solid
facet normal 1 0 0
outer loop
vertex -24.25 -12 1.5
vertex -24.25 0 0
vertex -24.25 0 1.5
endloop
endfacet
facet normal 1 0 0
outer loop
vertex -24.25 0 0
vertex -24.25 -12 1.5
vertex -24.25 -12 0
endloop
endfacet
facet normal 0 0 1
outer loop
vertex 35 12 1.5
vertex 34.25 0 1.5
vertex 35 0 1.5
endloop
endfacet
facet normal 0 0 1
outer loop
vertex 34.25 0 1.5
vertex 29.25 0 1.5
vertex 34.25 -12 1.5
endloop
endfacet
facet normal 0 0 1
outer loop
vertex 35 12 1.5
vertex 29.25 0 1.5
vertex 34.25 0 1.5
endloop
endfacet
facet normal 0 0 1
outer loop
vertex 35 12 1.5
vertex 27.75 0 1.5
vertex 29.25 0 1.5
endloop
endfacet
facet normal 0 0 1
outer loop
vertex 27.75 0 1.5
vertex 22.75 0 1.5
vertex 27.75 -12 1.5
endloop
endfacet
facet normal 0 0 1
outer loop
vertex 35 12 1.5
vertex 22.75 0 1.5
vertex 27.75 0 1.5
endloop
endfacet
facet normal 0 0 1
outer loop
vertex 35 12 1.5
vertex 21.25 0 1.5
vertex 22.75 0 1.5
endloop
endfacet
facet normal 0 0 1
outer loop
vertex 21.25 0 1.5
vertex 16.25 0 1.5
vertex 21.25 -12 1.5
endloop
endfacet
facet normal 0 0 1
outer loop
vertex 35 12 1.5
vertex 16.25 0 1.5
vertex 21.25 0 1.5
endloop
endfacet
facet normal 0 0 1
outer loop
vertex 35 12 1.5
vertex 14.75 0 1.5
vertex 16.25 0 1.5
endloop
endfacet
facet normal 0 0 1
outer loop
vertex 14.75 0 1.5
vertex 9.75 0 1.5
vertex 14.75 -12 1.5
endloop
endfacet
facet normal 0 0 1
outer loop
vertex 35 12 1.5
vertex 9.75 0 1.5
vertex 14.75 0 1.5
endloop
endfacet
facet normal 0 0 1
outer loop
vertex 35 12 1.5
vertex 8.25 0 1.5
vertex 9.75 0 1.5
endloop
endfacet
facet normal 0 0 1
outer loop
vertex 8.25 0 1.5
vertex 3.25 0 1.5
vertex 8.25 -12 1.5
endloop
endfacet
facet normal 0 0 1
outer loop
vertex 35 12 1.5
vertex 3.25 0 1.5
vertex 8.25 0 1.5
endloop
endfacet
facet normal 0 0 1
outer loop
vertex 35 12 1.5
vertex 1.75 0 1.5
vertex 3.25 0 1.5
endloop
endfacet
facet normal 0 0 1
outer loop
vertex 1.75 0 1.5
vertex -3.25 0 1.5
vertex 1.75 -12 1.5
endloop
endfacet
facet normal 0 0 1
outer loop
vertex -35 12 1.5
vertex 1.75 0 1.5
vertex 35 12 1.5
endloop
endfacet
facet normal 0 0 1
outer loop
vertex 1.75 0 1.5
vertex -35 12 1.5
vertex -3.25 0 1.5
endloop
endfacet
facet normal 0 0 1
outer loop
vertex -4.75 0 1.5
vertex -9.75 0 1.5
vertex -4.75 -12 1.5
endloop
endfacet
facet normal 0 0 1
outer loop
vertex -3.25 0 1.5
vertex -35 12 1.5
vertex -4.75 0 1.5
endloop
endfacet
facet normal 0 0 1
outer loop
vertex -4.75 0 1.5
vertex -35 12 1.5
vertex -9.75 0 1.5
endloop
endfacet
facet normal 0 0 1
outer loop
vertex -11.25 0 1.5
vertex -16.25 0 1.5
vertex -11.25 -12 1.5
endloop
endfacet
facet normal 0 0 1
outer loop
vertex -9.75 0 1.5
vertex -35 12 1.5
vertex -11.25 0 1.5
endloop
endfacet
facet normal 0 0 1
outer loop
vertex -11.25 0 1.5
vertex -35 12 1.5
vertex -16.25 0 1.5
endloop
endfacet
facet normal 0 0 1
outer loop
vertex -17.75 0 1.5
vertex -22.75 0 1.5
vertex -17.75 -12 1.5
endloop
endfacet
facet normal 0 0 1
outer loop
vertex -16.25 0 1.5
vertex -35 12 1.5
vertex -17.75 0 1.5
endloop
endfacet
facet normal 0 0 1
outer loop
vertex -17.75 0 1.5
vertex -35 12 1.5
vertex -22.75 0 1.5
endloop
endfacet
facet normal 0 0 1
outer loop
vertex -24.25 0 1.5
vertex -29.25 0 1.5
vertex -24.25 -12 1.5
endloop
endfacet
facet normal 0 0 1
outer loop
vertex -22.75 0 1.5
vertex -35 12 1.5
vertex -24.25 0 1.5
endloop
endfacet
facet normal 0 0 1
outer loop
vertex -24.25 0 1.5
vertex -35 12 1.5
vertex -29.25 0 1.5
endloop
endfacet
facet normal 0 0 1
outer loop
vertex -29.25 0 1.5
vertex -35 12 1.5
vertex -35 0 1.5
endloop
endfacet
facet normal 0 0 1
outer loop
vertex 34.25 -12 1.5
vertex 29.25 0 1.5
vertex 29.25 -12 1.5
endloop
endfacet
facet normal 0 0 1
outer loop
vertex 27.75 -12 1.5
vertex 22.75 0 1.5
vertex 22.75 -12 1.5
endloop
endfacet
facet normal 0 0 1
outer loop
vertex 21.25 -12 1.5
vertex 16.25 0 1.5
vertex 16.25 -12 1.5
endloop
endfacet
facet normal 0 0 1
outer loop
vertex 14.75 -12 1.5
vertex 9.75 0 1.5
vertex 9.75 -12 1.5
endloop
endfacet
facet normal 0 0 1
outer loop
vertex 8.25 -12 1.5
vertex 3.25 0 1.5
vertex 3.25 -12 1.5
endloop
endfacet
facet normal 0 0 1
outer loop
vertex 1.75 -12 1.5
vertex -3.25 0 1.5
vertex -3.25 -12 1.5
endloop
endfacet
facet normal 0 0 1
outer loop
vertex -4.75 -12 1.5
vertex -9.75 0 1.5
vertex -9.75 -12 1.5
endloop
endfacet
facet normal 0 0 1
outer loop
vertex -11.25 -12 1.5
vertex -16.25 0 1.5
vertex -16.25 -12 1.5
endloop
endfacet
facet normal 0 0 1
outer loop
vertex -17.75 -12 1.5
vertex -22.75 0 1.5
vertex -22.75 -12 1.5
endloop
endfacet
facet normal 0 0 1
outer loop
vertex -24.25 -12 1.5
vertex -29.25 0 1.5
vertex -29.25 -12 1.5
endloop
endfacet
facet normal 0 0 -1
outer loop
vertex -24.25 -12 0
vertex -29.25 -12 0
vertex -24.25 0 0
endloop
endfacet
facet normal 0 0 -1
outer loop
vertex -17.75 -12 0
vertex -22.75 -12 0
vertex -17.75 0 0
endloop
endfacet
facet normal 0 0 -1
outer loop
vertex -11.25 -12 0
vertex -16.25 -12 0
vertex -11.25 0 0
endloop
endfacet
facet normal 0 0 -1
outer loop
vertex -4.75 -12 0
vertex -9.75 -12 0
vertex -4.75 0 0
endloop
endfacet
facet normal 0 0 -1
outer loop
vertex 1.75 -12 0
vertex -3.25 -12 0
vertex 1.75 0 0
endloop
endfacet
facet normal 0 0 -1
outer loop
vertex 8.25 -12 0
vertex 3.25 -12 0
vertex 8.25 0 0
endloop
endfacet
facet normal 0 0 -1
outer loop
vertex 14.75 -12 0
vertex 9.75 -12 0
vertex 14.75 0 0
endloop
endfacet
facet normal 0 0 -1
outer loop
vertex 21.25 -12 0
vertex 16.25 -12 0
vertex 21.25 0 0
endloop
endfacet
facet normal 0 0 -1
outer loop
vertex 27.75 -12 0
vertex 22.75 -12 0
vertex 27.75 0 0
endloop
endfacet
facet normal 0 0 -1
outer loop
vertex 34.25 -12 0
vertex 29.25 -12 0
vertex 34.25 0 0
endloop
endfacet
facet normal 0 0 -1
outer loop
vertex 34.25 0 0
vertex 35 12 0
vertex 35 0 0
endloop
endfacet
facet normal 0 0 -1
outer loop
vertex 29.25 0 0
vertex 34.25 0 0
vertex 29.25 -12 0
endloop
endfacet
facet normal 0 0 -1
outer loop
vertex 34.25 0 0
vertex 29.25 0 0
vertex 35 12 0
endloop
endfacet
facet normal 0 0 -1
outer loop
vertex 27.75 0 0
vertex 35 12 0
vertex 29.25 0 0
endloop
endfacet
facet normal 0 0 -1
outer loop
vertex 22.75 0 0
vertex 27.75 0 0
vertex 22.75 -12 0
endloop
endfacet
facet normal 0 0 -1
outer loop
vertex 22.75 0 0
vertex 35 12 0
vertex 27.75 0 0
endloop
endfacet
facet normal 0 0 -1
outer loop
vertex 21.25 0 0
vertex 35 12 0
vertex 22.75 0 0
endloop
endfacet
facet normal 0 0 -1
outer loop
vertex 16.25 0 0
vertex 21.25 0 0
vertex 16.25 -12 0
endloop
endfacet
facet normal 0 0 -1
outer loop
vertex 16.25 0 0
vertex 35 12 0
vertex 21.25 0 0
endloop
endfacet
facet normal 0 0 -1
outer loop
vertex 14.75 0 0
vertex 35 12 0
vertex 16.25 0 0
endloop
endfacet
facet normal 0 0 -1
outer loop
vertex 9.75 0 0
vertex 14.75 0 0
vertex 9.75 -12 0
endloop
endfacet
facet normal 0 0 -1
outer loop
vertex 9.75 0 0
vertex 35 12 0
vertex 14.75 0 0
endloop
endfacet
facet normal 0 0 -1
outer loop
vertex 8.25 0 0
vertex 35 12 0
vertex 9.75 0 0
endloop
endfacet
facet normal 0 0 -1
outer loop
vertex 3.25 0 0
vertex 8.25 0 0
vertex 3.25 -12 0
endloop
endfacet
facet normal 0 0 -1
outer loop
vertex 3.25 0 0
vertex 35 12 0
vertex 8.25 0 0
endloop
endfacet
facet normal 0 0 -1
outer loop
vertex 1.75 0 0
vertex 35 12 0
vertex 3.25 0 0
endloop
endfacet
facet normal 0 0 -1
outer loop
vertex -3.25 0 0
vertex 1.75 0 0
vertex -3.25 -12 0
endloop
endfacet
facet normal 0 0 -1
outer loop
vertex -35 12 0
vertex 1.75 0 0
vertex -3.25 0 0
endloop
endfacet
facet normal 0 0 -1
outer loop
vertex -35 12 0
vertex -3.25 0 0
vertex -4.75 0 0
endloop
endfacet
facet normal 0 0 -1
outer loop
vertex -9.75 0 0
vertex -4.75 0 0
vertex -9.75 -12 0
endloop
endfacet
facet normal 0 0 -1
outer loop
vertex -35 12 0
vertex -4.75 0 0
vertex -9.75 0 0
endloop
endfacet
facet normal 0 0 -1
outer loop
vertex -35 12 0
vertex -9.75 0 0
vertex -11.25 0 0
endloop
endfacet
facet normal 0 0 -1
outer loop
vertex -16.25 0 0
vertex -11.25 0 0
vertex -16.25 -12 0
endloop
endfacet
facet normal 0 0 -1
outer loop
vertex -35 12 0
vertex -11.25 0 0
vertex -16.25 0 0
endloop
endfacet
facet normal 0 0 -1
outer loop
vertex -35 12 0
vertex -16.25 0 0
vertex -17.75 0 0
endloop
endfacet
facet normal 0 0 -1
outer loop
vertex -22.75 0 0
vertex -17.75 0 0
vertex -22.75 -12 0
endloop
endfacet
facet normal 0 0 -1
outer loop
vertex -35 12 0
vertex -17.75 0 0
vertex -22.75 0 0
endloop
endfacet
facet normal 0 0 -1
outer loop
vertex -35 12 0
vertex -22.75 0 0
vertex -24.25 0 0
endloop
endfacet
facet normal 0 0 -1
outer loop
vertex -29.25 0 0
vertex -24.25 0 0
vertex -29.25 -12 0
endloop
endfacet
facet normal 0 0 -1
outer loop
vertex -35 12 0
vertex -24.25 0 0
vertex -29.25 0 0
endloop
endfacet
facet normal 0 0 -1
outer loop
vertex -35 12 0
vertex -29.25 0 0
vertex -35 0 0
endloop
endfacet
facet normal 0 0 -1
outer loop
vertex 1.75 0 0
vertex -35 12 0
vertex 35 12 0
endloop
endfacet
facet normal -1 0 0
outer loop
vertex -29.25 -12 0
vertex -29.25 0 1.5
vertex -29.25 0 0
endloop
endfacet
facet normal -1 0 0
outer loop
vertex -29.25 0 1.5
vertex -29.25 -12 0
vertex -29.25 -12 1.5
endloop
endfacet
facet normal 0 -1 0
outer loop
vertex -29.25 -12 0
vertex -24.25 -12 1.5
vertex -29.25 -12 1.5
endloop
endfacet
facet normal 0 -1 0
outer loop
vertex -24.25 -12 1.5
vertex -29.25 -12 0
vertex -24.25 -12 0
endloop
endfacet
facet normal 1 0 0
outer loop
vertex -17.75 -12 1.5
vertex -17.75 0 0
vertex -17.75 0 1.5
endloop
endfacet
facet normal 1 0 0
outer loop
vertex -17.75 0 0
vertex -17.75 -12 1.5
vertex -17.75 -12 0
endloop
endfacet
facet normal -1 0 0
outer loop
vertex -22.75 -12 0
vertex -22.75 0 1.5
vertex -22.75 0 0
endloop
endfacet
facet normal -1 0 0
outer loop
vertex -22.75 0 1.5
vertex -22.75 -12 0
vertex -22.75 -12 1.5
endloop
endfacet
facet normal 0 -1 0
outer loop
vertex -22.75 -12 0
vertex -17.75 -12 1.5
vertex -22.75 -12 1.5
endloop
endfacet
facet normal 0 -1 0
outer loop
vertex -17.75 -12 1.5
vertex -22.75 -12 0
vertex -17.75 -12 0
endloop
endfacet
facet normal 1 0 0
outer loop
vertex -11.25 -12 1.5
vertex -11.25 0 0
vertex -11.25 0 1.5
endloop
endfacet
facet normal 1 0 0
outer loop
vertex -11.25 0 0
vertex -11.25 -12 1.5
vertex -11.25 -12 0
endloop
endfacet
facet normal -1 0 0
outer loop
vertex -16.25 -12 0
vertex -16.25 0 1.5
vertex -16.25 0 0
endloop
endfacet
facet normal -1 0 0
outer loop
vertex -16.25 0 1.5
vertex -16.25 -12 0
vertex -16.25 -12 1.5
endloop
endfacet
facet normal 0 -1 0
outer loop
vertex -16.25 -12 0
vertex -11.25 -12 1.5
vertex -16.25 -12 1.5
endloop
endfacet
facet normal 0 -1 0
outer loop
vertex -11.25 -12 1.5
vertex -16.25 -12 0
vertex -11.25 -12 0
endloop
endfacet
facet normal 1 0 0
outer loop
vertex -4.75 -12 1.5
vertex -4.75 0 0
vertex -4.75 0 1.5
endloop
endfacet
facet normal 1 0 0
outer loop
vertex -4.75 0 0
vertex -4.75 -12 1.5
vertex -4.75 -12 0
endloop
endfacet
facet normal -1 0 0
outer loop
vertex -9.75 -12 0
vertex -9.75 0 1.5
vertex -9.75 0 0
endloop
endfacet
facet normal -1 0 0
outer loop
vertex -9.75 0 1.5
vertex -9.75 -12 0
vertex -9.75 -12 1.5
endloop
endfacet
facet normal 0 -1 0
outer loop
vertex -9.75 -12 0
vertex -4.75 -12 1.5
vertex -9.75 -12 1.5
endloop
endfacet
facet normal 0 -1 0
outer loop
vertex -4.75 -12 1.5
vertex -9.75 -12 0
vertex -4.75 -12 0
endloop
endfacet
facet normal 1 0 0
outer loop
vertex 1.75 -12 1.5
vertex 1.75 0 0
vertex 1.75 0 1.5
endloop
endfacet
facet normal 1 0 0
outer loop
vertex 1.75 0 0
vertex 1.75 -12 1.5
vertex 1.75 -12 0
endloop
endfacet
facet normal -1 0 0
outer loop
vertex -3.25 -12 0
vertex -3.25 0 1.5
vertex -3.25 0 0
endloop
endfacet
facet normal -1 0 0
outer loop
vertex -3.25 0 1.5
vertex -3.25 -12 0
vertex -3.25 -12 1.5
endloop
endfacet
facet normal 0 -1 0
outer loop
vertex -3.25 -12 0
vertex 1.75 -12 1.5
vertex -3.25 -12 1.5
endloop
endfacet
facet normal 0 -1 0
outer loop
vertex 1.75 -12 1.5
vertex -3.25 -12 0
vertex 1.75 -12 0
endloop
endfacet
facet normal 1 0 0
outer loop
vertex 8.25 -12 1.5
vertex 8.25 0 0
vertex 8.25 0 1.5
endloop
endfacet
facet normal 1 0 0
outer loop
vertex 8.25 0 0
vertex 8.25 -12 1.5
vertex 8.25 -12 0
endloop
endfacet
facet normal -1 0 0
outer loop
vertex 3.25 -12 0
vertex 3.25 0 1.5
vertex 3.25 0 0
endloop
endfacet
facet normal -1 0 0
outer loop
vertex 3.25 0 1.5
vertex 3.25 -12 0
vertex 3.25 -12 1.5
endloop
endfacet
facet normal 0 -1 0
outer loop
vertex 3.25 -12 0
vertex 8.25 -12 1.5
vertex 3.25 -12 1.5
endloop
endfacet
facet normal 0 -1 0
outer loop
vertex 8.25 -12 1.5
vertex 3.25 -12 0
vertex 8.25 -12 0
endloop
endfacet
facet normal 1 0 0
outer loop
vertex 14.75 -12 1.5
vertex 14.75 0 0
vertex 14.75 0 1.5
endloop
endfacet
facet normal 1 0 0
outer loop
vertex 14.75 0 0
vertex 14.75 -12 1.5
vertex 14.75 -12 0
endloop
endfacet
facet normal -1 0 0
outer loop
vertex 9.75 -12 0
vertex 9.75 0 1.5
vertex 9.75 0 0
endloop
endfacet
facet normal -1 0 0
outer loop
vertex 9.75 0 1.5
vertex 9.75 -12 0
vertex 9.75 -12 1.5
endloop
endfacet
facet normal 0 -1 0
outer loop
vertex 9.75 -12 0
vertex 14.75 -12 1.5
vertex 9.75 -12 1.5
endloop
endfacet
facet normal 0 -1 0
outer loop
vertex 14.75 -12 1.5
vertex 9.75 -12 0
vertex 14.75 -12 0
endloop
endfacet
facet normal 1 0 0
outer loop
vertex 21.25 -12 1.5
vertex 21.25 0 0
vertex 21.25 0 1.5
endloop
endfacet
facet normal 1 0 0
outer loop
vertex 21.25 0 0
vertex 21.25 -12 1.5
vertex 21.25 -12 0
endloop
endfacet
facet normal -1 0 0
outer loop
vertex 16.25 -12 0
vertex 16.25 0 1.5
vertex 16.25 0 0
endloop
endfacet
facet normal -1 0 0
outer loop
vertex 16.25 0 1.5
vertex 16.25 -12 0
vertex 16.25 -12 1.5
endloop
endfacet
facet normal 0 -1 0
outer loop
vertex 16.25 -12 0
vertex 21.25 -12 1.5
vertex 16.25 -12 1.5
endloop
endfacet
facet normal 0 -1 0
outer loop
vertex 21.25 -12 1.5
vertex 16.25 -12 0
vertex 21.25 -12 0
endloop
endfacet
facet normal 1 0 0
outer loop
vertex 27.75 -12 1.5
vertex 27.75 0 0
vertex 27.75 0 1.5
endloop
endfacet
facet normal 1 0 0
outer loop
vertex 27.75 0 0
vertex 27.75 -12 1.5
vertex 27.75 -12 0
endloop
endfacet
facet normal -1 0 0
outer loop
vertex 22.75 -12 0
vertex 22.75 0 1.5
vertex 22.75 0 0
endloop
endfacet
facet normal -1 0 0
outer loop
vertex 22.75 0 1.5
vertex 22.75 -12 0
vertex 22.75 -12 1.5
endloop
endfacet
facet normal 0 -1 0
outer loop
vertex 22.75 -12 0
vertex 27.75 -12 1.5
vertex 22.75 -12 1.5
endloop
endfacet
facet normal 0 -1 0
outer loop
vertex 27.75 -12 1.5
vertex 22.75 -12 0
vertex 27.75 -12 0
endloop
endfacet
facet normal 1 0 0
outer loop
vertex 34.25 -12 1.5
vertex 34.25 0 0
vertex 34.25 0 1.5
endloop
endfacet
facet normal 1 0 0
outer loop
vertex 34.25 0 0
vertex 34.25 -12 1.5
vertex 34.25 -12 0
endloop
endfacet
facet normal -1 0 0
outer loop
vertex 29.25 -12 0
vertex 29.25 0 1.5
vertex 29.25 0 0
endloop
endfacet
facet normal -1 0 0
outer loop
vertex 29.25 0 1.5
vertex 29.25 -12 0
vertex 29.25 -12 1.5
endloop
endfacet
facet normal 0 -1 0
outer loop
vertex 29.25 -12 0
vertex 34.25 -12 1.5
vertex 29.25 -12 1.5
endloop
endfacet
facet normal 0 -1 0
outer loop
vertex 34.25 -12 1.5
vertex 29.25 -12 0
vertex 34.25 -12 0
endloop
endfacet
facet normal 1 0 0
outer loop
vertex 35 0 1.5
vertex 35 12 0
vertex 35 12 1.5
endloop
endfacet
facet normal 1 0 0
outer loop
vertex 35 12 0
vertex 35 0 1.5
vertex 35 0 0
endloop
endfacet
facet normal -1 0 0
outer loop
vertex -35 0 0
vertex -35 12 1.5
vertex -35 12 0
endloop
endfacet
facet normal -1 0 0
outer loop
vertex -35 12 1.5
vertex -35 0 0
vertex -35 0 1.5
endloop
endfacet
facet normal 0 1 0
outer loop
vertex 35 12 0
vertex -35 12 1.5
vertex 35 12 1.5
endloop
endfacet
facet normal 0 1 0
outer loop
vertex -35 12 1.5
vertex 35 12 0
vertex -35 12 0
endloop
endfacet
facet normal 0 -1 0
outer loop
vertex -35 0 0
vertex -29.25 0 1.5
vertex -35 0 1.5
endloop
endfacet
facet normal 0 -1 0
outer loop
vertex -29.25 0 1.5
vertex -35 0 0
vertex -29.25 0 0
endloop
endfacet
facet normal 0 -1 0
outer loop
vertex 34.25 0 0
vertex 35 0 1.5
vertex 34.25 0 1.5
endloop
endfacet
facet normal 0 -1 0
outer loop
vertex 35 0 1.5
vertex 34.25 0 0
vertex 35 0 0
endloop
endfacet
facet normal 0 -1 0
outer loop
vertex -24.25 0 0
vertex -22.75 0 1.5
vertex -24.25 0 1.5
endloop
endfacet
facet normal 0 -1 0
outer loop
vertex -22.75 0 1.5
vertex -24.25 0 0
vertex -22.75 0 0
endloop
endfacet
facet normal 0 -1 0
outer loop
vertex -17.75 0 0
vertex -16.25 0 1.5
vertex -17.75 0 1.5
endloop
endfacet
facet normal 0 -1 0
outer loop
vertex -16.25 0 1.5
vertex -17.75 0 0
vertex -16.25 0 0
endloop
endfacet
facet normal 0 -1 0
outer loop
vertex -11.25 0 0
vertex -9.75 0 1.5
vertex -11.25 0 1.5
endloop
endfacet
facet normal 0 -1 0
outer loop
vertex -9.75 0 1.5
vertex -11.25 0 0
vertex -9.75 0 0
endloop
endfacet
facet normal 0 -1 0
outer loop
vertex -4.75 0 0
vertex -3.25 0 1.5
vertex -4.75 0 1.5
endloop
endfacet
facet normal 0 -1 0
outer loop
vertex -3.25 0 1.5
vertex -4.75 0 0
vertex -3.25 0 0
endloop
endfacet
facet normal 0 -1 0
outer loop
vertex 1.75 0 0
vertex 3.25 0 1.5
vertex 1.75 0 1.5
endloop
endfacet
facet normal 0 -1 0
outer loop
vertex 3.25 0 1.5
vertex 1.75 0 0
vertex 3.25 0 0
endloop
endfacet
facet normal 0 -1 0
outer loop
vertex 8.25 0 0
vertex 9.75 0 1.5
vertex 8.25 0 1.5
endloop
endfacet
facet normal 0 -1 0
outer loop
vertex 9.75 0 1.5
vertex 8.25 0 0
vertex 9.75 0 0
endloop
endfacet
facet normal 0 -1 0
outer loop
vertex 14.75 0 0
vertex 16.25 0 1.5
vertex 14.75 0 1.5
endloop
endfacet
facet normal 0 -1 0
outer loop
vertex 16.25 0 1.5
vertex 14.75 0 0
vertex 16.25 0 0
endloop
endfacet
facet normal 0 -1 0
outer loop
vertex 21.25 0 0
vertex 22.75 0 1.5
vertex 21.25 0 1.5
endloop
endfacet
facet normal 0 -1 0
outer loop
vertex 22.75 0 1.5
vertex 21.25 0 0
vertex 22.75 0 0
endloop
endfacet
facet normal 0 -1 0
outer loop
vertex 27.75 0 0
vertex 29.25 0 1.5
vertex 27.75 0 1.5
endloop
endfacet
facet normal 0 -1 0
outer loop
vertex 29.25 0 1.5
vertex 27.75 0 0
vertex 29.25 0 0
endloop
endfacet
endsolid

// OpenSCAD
// 10-well agarose gel comb - printed lying flat
// Units: mm

plate_t      = 1.5;   // plate thickness (Z)
spine_len    = 70;    // spine length (X)
spine_w      = 12;    // spine width (Y)
teeth_n      = 10;    // number of teeth
teeth_w      = 5;     // tooth width (X)
teeth_l      = 12;    // tooth length (Y)
teeth_gap    = 1.5;   // gap between teeth (X)
overcut      = 0.5;   // cutter overshoot past faces

$fn = 64;

pitch = teeth_w + teeth_gap;
x0    = -(teeth_n - 1) * pitch / 2;        // first tooth centre X
// teeth span = 10*5 + 9*1.5 = 58.5, centred on 70 mm spine

union() {
    // spine (back bar)
    translate([-spine_len/2, 0, 0])
        cube([spine_len, spine_w, plate_t]);

    // teeth hanging in -Y
    for (i = [0 : teeth_n - 1])
        translate([x0 + i * pitch, -teeth_l, 0])
            cube([teeth_w, teeth_l + overcut, plate_t]);
}
